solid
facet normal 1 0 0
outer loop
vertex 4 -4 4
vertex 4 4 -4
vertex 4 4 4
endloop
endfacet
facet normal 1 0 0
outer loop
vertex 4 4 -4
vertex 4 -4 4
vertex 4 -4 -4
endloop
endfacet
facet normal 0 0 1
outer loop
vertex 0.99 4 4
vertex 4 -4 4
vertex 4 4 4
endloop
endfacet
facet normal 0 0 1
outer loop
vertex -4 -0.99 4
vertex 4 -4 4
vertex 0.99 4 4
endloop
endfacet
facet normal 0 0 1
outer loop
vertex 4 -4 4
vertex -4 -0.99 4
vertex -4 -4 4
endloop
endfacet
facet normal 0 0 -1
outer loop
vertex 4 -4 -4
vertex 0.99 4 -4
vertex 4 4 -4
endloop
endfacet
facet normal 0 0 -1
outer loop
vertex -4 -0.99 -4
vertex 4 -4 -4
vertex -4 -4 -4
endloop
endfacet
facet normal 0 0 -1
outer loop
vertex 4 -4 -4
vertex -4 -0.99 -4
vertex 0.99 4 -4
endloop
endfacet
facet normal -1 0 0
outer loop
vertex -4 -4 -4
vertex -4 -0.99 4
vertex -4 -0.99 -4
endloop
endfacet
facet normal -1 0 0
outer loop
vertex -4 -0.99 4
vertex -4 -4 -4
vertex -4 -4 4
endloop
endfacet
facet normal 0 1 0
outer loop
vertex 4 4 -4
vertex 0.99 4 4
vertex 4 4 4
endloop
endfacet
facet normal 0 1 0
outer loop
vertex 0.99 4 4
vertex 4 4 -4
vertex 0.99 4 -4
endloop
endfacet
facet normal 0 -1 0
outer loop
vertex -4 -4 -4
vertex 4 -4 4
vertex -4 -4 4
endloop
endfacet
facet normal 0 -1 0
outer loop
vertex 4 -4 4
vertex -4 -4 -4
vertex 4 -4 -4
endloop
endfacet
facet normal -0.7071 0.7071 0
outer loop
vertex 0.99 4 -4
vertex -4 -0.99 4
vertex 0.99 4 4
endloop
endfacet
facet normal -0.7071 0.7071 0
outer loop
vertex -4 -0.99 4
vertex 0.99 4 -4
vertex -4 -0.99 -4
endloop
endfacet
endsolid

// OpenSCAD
debug = ["SnapFitHead"];
eps=0.01;

module SnapFitHead(angle=45, offset_h = 3, box=[8, 8, 8]) {
    rotate([180, 180, 180]) {
            side1 = box[0]-offset_h;
            side2 = tan(angle)*side1;
            assert(side1 >= 0);
            assert(side2 <= box[1]);
            difference() {
                cube(box, center=true);
                translate([-box[0]/2,box[1]/2-side2+eps,-box[2]/2])
                    linear_extrude(box[2])
                    polygon(points=[[0,0],
                                    [0,side2],
                                    [side1,side2]]);
            }
            }
}

for(val = debug){
    if(val =="SnapFitHead")
        SnapFitHead();
}
